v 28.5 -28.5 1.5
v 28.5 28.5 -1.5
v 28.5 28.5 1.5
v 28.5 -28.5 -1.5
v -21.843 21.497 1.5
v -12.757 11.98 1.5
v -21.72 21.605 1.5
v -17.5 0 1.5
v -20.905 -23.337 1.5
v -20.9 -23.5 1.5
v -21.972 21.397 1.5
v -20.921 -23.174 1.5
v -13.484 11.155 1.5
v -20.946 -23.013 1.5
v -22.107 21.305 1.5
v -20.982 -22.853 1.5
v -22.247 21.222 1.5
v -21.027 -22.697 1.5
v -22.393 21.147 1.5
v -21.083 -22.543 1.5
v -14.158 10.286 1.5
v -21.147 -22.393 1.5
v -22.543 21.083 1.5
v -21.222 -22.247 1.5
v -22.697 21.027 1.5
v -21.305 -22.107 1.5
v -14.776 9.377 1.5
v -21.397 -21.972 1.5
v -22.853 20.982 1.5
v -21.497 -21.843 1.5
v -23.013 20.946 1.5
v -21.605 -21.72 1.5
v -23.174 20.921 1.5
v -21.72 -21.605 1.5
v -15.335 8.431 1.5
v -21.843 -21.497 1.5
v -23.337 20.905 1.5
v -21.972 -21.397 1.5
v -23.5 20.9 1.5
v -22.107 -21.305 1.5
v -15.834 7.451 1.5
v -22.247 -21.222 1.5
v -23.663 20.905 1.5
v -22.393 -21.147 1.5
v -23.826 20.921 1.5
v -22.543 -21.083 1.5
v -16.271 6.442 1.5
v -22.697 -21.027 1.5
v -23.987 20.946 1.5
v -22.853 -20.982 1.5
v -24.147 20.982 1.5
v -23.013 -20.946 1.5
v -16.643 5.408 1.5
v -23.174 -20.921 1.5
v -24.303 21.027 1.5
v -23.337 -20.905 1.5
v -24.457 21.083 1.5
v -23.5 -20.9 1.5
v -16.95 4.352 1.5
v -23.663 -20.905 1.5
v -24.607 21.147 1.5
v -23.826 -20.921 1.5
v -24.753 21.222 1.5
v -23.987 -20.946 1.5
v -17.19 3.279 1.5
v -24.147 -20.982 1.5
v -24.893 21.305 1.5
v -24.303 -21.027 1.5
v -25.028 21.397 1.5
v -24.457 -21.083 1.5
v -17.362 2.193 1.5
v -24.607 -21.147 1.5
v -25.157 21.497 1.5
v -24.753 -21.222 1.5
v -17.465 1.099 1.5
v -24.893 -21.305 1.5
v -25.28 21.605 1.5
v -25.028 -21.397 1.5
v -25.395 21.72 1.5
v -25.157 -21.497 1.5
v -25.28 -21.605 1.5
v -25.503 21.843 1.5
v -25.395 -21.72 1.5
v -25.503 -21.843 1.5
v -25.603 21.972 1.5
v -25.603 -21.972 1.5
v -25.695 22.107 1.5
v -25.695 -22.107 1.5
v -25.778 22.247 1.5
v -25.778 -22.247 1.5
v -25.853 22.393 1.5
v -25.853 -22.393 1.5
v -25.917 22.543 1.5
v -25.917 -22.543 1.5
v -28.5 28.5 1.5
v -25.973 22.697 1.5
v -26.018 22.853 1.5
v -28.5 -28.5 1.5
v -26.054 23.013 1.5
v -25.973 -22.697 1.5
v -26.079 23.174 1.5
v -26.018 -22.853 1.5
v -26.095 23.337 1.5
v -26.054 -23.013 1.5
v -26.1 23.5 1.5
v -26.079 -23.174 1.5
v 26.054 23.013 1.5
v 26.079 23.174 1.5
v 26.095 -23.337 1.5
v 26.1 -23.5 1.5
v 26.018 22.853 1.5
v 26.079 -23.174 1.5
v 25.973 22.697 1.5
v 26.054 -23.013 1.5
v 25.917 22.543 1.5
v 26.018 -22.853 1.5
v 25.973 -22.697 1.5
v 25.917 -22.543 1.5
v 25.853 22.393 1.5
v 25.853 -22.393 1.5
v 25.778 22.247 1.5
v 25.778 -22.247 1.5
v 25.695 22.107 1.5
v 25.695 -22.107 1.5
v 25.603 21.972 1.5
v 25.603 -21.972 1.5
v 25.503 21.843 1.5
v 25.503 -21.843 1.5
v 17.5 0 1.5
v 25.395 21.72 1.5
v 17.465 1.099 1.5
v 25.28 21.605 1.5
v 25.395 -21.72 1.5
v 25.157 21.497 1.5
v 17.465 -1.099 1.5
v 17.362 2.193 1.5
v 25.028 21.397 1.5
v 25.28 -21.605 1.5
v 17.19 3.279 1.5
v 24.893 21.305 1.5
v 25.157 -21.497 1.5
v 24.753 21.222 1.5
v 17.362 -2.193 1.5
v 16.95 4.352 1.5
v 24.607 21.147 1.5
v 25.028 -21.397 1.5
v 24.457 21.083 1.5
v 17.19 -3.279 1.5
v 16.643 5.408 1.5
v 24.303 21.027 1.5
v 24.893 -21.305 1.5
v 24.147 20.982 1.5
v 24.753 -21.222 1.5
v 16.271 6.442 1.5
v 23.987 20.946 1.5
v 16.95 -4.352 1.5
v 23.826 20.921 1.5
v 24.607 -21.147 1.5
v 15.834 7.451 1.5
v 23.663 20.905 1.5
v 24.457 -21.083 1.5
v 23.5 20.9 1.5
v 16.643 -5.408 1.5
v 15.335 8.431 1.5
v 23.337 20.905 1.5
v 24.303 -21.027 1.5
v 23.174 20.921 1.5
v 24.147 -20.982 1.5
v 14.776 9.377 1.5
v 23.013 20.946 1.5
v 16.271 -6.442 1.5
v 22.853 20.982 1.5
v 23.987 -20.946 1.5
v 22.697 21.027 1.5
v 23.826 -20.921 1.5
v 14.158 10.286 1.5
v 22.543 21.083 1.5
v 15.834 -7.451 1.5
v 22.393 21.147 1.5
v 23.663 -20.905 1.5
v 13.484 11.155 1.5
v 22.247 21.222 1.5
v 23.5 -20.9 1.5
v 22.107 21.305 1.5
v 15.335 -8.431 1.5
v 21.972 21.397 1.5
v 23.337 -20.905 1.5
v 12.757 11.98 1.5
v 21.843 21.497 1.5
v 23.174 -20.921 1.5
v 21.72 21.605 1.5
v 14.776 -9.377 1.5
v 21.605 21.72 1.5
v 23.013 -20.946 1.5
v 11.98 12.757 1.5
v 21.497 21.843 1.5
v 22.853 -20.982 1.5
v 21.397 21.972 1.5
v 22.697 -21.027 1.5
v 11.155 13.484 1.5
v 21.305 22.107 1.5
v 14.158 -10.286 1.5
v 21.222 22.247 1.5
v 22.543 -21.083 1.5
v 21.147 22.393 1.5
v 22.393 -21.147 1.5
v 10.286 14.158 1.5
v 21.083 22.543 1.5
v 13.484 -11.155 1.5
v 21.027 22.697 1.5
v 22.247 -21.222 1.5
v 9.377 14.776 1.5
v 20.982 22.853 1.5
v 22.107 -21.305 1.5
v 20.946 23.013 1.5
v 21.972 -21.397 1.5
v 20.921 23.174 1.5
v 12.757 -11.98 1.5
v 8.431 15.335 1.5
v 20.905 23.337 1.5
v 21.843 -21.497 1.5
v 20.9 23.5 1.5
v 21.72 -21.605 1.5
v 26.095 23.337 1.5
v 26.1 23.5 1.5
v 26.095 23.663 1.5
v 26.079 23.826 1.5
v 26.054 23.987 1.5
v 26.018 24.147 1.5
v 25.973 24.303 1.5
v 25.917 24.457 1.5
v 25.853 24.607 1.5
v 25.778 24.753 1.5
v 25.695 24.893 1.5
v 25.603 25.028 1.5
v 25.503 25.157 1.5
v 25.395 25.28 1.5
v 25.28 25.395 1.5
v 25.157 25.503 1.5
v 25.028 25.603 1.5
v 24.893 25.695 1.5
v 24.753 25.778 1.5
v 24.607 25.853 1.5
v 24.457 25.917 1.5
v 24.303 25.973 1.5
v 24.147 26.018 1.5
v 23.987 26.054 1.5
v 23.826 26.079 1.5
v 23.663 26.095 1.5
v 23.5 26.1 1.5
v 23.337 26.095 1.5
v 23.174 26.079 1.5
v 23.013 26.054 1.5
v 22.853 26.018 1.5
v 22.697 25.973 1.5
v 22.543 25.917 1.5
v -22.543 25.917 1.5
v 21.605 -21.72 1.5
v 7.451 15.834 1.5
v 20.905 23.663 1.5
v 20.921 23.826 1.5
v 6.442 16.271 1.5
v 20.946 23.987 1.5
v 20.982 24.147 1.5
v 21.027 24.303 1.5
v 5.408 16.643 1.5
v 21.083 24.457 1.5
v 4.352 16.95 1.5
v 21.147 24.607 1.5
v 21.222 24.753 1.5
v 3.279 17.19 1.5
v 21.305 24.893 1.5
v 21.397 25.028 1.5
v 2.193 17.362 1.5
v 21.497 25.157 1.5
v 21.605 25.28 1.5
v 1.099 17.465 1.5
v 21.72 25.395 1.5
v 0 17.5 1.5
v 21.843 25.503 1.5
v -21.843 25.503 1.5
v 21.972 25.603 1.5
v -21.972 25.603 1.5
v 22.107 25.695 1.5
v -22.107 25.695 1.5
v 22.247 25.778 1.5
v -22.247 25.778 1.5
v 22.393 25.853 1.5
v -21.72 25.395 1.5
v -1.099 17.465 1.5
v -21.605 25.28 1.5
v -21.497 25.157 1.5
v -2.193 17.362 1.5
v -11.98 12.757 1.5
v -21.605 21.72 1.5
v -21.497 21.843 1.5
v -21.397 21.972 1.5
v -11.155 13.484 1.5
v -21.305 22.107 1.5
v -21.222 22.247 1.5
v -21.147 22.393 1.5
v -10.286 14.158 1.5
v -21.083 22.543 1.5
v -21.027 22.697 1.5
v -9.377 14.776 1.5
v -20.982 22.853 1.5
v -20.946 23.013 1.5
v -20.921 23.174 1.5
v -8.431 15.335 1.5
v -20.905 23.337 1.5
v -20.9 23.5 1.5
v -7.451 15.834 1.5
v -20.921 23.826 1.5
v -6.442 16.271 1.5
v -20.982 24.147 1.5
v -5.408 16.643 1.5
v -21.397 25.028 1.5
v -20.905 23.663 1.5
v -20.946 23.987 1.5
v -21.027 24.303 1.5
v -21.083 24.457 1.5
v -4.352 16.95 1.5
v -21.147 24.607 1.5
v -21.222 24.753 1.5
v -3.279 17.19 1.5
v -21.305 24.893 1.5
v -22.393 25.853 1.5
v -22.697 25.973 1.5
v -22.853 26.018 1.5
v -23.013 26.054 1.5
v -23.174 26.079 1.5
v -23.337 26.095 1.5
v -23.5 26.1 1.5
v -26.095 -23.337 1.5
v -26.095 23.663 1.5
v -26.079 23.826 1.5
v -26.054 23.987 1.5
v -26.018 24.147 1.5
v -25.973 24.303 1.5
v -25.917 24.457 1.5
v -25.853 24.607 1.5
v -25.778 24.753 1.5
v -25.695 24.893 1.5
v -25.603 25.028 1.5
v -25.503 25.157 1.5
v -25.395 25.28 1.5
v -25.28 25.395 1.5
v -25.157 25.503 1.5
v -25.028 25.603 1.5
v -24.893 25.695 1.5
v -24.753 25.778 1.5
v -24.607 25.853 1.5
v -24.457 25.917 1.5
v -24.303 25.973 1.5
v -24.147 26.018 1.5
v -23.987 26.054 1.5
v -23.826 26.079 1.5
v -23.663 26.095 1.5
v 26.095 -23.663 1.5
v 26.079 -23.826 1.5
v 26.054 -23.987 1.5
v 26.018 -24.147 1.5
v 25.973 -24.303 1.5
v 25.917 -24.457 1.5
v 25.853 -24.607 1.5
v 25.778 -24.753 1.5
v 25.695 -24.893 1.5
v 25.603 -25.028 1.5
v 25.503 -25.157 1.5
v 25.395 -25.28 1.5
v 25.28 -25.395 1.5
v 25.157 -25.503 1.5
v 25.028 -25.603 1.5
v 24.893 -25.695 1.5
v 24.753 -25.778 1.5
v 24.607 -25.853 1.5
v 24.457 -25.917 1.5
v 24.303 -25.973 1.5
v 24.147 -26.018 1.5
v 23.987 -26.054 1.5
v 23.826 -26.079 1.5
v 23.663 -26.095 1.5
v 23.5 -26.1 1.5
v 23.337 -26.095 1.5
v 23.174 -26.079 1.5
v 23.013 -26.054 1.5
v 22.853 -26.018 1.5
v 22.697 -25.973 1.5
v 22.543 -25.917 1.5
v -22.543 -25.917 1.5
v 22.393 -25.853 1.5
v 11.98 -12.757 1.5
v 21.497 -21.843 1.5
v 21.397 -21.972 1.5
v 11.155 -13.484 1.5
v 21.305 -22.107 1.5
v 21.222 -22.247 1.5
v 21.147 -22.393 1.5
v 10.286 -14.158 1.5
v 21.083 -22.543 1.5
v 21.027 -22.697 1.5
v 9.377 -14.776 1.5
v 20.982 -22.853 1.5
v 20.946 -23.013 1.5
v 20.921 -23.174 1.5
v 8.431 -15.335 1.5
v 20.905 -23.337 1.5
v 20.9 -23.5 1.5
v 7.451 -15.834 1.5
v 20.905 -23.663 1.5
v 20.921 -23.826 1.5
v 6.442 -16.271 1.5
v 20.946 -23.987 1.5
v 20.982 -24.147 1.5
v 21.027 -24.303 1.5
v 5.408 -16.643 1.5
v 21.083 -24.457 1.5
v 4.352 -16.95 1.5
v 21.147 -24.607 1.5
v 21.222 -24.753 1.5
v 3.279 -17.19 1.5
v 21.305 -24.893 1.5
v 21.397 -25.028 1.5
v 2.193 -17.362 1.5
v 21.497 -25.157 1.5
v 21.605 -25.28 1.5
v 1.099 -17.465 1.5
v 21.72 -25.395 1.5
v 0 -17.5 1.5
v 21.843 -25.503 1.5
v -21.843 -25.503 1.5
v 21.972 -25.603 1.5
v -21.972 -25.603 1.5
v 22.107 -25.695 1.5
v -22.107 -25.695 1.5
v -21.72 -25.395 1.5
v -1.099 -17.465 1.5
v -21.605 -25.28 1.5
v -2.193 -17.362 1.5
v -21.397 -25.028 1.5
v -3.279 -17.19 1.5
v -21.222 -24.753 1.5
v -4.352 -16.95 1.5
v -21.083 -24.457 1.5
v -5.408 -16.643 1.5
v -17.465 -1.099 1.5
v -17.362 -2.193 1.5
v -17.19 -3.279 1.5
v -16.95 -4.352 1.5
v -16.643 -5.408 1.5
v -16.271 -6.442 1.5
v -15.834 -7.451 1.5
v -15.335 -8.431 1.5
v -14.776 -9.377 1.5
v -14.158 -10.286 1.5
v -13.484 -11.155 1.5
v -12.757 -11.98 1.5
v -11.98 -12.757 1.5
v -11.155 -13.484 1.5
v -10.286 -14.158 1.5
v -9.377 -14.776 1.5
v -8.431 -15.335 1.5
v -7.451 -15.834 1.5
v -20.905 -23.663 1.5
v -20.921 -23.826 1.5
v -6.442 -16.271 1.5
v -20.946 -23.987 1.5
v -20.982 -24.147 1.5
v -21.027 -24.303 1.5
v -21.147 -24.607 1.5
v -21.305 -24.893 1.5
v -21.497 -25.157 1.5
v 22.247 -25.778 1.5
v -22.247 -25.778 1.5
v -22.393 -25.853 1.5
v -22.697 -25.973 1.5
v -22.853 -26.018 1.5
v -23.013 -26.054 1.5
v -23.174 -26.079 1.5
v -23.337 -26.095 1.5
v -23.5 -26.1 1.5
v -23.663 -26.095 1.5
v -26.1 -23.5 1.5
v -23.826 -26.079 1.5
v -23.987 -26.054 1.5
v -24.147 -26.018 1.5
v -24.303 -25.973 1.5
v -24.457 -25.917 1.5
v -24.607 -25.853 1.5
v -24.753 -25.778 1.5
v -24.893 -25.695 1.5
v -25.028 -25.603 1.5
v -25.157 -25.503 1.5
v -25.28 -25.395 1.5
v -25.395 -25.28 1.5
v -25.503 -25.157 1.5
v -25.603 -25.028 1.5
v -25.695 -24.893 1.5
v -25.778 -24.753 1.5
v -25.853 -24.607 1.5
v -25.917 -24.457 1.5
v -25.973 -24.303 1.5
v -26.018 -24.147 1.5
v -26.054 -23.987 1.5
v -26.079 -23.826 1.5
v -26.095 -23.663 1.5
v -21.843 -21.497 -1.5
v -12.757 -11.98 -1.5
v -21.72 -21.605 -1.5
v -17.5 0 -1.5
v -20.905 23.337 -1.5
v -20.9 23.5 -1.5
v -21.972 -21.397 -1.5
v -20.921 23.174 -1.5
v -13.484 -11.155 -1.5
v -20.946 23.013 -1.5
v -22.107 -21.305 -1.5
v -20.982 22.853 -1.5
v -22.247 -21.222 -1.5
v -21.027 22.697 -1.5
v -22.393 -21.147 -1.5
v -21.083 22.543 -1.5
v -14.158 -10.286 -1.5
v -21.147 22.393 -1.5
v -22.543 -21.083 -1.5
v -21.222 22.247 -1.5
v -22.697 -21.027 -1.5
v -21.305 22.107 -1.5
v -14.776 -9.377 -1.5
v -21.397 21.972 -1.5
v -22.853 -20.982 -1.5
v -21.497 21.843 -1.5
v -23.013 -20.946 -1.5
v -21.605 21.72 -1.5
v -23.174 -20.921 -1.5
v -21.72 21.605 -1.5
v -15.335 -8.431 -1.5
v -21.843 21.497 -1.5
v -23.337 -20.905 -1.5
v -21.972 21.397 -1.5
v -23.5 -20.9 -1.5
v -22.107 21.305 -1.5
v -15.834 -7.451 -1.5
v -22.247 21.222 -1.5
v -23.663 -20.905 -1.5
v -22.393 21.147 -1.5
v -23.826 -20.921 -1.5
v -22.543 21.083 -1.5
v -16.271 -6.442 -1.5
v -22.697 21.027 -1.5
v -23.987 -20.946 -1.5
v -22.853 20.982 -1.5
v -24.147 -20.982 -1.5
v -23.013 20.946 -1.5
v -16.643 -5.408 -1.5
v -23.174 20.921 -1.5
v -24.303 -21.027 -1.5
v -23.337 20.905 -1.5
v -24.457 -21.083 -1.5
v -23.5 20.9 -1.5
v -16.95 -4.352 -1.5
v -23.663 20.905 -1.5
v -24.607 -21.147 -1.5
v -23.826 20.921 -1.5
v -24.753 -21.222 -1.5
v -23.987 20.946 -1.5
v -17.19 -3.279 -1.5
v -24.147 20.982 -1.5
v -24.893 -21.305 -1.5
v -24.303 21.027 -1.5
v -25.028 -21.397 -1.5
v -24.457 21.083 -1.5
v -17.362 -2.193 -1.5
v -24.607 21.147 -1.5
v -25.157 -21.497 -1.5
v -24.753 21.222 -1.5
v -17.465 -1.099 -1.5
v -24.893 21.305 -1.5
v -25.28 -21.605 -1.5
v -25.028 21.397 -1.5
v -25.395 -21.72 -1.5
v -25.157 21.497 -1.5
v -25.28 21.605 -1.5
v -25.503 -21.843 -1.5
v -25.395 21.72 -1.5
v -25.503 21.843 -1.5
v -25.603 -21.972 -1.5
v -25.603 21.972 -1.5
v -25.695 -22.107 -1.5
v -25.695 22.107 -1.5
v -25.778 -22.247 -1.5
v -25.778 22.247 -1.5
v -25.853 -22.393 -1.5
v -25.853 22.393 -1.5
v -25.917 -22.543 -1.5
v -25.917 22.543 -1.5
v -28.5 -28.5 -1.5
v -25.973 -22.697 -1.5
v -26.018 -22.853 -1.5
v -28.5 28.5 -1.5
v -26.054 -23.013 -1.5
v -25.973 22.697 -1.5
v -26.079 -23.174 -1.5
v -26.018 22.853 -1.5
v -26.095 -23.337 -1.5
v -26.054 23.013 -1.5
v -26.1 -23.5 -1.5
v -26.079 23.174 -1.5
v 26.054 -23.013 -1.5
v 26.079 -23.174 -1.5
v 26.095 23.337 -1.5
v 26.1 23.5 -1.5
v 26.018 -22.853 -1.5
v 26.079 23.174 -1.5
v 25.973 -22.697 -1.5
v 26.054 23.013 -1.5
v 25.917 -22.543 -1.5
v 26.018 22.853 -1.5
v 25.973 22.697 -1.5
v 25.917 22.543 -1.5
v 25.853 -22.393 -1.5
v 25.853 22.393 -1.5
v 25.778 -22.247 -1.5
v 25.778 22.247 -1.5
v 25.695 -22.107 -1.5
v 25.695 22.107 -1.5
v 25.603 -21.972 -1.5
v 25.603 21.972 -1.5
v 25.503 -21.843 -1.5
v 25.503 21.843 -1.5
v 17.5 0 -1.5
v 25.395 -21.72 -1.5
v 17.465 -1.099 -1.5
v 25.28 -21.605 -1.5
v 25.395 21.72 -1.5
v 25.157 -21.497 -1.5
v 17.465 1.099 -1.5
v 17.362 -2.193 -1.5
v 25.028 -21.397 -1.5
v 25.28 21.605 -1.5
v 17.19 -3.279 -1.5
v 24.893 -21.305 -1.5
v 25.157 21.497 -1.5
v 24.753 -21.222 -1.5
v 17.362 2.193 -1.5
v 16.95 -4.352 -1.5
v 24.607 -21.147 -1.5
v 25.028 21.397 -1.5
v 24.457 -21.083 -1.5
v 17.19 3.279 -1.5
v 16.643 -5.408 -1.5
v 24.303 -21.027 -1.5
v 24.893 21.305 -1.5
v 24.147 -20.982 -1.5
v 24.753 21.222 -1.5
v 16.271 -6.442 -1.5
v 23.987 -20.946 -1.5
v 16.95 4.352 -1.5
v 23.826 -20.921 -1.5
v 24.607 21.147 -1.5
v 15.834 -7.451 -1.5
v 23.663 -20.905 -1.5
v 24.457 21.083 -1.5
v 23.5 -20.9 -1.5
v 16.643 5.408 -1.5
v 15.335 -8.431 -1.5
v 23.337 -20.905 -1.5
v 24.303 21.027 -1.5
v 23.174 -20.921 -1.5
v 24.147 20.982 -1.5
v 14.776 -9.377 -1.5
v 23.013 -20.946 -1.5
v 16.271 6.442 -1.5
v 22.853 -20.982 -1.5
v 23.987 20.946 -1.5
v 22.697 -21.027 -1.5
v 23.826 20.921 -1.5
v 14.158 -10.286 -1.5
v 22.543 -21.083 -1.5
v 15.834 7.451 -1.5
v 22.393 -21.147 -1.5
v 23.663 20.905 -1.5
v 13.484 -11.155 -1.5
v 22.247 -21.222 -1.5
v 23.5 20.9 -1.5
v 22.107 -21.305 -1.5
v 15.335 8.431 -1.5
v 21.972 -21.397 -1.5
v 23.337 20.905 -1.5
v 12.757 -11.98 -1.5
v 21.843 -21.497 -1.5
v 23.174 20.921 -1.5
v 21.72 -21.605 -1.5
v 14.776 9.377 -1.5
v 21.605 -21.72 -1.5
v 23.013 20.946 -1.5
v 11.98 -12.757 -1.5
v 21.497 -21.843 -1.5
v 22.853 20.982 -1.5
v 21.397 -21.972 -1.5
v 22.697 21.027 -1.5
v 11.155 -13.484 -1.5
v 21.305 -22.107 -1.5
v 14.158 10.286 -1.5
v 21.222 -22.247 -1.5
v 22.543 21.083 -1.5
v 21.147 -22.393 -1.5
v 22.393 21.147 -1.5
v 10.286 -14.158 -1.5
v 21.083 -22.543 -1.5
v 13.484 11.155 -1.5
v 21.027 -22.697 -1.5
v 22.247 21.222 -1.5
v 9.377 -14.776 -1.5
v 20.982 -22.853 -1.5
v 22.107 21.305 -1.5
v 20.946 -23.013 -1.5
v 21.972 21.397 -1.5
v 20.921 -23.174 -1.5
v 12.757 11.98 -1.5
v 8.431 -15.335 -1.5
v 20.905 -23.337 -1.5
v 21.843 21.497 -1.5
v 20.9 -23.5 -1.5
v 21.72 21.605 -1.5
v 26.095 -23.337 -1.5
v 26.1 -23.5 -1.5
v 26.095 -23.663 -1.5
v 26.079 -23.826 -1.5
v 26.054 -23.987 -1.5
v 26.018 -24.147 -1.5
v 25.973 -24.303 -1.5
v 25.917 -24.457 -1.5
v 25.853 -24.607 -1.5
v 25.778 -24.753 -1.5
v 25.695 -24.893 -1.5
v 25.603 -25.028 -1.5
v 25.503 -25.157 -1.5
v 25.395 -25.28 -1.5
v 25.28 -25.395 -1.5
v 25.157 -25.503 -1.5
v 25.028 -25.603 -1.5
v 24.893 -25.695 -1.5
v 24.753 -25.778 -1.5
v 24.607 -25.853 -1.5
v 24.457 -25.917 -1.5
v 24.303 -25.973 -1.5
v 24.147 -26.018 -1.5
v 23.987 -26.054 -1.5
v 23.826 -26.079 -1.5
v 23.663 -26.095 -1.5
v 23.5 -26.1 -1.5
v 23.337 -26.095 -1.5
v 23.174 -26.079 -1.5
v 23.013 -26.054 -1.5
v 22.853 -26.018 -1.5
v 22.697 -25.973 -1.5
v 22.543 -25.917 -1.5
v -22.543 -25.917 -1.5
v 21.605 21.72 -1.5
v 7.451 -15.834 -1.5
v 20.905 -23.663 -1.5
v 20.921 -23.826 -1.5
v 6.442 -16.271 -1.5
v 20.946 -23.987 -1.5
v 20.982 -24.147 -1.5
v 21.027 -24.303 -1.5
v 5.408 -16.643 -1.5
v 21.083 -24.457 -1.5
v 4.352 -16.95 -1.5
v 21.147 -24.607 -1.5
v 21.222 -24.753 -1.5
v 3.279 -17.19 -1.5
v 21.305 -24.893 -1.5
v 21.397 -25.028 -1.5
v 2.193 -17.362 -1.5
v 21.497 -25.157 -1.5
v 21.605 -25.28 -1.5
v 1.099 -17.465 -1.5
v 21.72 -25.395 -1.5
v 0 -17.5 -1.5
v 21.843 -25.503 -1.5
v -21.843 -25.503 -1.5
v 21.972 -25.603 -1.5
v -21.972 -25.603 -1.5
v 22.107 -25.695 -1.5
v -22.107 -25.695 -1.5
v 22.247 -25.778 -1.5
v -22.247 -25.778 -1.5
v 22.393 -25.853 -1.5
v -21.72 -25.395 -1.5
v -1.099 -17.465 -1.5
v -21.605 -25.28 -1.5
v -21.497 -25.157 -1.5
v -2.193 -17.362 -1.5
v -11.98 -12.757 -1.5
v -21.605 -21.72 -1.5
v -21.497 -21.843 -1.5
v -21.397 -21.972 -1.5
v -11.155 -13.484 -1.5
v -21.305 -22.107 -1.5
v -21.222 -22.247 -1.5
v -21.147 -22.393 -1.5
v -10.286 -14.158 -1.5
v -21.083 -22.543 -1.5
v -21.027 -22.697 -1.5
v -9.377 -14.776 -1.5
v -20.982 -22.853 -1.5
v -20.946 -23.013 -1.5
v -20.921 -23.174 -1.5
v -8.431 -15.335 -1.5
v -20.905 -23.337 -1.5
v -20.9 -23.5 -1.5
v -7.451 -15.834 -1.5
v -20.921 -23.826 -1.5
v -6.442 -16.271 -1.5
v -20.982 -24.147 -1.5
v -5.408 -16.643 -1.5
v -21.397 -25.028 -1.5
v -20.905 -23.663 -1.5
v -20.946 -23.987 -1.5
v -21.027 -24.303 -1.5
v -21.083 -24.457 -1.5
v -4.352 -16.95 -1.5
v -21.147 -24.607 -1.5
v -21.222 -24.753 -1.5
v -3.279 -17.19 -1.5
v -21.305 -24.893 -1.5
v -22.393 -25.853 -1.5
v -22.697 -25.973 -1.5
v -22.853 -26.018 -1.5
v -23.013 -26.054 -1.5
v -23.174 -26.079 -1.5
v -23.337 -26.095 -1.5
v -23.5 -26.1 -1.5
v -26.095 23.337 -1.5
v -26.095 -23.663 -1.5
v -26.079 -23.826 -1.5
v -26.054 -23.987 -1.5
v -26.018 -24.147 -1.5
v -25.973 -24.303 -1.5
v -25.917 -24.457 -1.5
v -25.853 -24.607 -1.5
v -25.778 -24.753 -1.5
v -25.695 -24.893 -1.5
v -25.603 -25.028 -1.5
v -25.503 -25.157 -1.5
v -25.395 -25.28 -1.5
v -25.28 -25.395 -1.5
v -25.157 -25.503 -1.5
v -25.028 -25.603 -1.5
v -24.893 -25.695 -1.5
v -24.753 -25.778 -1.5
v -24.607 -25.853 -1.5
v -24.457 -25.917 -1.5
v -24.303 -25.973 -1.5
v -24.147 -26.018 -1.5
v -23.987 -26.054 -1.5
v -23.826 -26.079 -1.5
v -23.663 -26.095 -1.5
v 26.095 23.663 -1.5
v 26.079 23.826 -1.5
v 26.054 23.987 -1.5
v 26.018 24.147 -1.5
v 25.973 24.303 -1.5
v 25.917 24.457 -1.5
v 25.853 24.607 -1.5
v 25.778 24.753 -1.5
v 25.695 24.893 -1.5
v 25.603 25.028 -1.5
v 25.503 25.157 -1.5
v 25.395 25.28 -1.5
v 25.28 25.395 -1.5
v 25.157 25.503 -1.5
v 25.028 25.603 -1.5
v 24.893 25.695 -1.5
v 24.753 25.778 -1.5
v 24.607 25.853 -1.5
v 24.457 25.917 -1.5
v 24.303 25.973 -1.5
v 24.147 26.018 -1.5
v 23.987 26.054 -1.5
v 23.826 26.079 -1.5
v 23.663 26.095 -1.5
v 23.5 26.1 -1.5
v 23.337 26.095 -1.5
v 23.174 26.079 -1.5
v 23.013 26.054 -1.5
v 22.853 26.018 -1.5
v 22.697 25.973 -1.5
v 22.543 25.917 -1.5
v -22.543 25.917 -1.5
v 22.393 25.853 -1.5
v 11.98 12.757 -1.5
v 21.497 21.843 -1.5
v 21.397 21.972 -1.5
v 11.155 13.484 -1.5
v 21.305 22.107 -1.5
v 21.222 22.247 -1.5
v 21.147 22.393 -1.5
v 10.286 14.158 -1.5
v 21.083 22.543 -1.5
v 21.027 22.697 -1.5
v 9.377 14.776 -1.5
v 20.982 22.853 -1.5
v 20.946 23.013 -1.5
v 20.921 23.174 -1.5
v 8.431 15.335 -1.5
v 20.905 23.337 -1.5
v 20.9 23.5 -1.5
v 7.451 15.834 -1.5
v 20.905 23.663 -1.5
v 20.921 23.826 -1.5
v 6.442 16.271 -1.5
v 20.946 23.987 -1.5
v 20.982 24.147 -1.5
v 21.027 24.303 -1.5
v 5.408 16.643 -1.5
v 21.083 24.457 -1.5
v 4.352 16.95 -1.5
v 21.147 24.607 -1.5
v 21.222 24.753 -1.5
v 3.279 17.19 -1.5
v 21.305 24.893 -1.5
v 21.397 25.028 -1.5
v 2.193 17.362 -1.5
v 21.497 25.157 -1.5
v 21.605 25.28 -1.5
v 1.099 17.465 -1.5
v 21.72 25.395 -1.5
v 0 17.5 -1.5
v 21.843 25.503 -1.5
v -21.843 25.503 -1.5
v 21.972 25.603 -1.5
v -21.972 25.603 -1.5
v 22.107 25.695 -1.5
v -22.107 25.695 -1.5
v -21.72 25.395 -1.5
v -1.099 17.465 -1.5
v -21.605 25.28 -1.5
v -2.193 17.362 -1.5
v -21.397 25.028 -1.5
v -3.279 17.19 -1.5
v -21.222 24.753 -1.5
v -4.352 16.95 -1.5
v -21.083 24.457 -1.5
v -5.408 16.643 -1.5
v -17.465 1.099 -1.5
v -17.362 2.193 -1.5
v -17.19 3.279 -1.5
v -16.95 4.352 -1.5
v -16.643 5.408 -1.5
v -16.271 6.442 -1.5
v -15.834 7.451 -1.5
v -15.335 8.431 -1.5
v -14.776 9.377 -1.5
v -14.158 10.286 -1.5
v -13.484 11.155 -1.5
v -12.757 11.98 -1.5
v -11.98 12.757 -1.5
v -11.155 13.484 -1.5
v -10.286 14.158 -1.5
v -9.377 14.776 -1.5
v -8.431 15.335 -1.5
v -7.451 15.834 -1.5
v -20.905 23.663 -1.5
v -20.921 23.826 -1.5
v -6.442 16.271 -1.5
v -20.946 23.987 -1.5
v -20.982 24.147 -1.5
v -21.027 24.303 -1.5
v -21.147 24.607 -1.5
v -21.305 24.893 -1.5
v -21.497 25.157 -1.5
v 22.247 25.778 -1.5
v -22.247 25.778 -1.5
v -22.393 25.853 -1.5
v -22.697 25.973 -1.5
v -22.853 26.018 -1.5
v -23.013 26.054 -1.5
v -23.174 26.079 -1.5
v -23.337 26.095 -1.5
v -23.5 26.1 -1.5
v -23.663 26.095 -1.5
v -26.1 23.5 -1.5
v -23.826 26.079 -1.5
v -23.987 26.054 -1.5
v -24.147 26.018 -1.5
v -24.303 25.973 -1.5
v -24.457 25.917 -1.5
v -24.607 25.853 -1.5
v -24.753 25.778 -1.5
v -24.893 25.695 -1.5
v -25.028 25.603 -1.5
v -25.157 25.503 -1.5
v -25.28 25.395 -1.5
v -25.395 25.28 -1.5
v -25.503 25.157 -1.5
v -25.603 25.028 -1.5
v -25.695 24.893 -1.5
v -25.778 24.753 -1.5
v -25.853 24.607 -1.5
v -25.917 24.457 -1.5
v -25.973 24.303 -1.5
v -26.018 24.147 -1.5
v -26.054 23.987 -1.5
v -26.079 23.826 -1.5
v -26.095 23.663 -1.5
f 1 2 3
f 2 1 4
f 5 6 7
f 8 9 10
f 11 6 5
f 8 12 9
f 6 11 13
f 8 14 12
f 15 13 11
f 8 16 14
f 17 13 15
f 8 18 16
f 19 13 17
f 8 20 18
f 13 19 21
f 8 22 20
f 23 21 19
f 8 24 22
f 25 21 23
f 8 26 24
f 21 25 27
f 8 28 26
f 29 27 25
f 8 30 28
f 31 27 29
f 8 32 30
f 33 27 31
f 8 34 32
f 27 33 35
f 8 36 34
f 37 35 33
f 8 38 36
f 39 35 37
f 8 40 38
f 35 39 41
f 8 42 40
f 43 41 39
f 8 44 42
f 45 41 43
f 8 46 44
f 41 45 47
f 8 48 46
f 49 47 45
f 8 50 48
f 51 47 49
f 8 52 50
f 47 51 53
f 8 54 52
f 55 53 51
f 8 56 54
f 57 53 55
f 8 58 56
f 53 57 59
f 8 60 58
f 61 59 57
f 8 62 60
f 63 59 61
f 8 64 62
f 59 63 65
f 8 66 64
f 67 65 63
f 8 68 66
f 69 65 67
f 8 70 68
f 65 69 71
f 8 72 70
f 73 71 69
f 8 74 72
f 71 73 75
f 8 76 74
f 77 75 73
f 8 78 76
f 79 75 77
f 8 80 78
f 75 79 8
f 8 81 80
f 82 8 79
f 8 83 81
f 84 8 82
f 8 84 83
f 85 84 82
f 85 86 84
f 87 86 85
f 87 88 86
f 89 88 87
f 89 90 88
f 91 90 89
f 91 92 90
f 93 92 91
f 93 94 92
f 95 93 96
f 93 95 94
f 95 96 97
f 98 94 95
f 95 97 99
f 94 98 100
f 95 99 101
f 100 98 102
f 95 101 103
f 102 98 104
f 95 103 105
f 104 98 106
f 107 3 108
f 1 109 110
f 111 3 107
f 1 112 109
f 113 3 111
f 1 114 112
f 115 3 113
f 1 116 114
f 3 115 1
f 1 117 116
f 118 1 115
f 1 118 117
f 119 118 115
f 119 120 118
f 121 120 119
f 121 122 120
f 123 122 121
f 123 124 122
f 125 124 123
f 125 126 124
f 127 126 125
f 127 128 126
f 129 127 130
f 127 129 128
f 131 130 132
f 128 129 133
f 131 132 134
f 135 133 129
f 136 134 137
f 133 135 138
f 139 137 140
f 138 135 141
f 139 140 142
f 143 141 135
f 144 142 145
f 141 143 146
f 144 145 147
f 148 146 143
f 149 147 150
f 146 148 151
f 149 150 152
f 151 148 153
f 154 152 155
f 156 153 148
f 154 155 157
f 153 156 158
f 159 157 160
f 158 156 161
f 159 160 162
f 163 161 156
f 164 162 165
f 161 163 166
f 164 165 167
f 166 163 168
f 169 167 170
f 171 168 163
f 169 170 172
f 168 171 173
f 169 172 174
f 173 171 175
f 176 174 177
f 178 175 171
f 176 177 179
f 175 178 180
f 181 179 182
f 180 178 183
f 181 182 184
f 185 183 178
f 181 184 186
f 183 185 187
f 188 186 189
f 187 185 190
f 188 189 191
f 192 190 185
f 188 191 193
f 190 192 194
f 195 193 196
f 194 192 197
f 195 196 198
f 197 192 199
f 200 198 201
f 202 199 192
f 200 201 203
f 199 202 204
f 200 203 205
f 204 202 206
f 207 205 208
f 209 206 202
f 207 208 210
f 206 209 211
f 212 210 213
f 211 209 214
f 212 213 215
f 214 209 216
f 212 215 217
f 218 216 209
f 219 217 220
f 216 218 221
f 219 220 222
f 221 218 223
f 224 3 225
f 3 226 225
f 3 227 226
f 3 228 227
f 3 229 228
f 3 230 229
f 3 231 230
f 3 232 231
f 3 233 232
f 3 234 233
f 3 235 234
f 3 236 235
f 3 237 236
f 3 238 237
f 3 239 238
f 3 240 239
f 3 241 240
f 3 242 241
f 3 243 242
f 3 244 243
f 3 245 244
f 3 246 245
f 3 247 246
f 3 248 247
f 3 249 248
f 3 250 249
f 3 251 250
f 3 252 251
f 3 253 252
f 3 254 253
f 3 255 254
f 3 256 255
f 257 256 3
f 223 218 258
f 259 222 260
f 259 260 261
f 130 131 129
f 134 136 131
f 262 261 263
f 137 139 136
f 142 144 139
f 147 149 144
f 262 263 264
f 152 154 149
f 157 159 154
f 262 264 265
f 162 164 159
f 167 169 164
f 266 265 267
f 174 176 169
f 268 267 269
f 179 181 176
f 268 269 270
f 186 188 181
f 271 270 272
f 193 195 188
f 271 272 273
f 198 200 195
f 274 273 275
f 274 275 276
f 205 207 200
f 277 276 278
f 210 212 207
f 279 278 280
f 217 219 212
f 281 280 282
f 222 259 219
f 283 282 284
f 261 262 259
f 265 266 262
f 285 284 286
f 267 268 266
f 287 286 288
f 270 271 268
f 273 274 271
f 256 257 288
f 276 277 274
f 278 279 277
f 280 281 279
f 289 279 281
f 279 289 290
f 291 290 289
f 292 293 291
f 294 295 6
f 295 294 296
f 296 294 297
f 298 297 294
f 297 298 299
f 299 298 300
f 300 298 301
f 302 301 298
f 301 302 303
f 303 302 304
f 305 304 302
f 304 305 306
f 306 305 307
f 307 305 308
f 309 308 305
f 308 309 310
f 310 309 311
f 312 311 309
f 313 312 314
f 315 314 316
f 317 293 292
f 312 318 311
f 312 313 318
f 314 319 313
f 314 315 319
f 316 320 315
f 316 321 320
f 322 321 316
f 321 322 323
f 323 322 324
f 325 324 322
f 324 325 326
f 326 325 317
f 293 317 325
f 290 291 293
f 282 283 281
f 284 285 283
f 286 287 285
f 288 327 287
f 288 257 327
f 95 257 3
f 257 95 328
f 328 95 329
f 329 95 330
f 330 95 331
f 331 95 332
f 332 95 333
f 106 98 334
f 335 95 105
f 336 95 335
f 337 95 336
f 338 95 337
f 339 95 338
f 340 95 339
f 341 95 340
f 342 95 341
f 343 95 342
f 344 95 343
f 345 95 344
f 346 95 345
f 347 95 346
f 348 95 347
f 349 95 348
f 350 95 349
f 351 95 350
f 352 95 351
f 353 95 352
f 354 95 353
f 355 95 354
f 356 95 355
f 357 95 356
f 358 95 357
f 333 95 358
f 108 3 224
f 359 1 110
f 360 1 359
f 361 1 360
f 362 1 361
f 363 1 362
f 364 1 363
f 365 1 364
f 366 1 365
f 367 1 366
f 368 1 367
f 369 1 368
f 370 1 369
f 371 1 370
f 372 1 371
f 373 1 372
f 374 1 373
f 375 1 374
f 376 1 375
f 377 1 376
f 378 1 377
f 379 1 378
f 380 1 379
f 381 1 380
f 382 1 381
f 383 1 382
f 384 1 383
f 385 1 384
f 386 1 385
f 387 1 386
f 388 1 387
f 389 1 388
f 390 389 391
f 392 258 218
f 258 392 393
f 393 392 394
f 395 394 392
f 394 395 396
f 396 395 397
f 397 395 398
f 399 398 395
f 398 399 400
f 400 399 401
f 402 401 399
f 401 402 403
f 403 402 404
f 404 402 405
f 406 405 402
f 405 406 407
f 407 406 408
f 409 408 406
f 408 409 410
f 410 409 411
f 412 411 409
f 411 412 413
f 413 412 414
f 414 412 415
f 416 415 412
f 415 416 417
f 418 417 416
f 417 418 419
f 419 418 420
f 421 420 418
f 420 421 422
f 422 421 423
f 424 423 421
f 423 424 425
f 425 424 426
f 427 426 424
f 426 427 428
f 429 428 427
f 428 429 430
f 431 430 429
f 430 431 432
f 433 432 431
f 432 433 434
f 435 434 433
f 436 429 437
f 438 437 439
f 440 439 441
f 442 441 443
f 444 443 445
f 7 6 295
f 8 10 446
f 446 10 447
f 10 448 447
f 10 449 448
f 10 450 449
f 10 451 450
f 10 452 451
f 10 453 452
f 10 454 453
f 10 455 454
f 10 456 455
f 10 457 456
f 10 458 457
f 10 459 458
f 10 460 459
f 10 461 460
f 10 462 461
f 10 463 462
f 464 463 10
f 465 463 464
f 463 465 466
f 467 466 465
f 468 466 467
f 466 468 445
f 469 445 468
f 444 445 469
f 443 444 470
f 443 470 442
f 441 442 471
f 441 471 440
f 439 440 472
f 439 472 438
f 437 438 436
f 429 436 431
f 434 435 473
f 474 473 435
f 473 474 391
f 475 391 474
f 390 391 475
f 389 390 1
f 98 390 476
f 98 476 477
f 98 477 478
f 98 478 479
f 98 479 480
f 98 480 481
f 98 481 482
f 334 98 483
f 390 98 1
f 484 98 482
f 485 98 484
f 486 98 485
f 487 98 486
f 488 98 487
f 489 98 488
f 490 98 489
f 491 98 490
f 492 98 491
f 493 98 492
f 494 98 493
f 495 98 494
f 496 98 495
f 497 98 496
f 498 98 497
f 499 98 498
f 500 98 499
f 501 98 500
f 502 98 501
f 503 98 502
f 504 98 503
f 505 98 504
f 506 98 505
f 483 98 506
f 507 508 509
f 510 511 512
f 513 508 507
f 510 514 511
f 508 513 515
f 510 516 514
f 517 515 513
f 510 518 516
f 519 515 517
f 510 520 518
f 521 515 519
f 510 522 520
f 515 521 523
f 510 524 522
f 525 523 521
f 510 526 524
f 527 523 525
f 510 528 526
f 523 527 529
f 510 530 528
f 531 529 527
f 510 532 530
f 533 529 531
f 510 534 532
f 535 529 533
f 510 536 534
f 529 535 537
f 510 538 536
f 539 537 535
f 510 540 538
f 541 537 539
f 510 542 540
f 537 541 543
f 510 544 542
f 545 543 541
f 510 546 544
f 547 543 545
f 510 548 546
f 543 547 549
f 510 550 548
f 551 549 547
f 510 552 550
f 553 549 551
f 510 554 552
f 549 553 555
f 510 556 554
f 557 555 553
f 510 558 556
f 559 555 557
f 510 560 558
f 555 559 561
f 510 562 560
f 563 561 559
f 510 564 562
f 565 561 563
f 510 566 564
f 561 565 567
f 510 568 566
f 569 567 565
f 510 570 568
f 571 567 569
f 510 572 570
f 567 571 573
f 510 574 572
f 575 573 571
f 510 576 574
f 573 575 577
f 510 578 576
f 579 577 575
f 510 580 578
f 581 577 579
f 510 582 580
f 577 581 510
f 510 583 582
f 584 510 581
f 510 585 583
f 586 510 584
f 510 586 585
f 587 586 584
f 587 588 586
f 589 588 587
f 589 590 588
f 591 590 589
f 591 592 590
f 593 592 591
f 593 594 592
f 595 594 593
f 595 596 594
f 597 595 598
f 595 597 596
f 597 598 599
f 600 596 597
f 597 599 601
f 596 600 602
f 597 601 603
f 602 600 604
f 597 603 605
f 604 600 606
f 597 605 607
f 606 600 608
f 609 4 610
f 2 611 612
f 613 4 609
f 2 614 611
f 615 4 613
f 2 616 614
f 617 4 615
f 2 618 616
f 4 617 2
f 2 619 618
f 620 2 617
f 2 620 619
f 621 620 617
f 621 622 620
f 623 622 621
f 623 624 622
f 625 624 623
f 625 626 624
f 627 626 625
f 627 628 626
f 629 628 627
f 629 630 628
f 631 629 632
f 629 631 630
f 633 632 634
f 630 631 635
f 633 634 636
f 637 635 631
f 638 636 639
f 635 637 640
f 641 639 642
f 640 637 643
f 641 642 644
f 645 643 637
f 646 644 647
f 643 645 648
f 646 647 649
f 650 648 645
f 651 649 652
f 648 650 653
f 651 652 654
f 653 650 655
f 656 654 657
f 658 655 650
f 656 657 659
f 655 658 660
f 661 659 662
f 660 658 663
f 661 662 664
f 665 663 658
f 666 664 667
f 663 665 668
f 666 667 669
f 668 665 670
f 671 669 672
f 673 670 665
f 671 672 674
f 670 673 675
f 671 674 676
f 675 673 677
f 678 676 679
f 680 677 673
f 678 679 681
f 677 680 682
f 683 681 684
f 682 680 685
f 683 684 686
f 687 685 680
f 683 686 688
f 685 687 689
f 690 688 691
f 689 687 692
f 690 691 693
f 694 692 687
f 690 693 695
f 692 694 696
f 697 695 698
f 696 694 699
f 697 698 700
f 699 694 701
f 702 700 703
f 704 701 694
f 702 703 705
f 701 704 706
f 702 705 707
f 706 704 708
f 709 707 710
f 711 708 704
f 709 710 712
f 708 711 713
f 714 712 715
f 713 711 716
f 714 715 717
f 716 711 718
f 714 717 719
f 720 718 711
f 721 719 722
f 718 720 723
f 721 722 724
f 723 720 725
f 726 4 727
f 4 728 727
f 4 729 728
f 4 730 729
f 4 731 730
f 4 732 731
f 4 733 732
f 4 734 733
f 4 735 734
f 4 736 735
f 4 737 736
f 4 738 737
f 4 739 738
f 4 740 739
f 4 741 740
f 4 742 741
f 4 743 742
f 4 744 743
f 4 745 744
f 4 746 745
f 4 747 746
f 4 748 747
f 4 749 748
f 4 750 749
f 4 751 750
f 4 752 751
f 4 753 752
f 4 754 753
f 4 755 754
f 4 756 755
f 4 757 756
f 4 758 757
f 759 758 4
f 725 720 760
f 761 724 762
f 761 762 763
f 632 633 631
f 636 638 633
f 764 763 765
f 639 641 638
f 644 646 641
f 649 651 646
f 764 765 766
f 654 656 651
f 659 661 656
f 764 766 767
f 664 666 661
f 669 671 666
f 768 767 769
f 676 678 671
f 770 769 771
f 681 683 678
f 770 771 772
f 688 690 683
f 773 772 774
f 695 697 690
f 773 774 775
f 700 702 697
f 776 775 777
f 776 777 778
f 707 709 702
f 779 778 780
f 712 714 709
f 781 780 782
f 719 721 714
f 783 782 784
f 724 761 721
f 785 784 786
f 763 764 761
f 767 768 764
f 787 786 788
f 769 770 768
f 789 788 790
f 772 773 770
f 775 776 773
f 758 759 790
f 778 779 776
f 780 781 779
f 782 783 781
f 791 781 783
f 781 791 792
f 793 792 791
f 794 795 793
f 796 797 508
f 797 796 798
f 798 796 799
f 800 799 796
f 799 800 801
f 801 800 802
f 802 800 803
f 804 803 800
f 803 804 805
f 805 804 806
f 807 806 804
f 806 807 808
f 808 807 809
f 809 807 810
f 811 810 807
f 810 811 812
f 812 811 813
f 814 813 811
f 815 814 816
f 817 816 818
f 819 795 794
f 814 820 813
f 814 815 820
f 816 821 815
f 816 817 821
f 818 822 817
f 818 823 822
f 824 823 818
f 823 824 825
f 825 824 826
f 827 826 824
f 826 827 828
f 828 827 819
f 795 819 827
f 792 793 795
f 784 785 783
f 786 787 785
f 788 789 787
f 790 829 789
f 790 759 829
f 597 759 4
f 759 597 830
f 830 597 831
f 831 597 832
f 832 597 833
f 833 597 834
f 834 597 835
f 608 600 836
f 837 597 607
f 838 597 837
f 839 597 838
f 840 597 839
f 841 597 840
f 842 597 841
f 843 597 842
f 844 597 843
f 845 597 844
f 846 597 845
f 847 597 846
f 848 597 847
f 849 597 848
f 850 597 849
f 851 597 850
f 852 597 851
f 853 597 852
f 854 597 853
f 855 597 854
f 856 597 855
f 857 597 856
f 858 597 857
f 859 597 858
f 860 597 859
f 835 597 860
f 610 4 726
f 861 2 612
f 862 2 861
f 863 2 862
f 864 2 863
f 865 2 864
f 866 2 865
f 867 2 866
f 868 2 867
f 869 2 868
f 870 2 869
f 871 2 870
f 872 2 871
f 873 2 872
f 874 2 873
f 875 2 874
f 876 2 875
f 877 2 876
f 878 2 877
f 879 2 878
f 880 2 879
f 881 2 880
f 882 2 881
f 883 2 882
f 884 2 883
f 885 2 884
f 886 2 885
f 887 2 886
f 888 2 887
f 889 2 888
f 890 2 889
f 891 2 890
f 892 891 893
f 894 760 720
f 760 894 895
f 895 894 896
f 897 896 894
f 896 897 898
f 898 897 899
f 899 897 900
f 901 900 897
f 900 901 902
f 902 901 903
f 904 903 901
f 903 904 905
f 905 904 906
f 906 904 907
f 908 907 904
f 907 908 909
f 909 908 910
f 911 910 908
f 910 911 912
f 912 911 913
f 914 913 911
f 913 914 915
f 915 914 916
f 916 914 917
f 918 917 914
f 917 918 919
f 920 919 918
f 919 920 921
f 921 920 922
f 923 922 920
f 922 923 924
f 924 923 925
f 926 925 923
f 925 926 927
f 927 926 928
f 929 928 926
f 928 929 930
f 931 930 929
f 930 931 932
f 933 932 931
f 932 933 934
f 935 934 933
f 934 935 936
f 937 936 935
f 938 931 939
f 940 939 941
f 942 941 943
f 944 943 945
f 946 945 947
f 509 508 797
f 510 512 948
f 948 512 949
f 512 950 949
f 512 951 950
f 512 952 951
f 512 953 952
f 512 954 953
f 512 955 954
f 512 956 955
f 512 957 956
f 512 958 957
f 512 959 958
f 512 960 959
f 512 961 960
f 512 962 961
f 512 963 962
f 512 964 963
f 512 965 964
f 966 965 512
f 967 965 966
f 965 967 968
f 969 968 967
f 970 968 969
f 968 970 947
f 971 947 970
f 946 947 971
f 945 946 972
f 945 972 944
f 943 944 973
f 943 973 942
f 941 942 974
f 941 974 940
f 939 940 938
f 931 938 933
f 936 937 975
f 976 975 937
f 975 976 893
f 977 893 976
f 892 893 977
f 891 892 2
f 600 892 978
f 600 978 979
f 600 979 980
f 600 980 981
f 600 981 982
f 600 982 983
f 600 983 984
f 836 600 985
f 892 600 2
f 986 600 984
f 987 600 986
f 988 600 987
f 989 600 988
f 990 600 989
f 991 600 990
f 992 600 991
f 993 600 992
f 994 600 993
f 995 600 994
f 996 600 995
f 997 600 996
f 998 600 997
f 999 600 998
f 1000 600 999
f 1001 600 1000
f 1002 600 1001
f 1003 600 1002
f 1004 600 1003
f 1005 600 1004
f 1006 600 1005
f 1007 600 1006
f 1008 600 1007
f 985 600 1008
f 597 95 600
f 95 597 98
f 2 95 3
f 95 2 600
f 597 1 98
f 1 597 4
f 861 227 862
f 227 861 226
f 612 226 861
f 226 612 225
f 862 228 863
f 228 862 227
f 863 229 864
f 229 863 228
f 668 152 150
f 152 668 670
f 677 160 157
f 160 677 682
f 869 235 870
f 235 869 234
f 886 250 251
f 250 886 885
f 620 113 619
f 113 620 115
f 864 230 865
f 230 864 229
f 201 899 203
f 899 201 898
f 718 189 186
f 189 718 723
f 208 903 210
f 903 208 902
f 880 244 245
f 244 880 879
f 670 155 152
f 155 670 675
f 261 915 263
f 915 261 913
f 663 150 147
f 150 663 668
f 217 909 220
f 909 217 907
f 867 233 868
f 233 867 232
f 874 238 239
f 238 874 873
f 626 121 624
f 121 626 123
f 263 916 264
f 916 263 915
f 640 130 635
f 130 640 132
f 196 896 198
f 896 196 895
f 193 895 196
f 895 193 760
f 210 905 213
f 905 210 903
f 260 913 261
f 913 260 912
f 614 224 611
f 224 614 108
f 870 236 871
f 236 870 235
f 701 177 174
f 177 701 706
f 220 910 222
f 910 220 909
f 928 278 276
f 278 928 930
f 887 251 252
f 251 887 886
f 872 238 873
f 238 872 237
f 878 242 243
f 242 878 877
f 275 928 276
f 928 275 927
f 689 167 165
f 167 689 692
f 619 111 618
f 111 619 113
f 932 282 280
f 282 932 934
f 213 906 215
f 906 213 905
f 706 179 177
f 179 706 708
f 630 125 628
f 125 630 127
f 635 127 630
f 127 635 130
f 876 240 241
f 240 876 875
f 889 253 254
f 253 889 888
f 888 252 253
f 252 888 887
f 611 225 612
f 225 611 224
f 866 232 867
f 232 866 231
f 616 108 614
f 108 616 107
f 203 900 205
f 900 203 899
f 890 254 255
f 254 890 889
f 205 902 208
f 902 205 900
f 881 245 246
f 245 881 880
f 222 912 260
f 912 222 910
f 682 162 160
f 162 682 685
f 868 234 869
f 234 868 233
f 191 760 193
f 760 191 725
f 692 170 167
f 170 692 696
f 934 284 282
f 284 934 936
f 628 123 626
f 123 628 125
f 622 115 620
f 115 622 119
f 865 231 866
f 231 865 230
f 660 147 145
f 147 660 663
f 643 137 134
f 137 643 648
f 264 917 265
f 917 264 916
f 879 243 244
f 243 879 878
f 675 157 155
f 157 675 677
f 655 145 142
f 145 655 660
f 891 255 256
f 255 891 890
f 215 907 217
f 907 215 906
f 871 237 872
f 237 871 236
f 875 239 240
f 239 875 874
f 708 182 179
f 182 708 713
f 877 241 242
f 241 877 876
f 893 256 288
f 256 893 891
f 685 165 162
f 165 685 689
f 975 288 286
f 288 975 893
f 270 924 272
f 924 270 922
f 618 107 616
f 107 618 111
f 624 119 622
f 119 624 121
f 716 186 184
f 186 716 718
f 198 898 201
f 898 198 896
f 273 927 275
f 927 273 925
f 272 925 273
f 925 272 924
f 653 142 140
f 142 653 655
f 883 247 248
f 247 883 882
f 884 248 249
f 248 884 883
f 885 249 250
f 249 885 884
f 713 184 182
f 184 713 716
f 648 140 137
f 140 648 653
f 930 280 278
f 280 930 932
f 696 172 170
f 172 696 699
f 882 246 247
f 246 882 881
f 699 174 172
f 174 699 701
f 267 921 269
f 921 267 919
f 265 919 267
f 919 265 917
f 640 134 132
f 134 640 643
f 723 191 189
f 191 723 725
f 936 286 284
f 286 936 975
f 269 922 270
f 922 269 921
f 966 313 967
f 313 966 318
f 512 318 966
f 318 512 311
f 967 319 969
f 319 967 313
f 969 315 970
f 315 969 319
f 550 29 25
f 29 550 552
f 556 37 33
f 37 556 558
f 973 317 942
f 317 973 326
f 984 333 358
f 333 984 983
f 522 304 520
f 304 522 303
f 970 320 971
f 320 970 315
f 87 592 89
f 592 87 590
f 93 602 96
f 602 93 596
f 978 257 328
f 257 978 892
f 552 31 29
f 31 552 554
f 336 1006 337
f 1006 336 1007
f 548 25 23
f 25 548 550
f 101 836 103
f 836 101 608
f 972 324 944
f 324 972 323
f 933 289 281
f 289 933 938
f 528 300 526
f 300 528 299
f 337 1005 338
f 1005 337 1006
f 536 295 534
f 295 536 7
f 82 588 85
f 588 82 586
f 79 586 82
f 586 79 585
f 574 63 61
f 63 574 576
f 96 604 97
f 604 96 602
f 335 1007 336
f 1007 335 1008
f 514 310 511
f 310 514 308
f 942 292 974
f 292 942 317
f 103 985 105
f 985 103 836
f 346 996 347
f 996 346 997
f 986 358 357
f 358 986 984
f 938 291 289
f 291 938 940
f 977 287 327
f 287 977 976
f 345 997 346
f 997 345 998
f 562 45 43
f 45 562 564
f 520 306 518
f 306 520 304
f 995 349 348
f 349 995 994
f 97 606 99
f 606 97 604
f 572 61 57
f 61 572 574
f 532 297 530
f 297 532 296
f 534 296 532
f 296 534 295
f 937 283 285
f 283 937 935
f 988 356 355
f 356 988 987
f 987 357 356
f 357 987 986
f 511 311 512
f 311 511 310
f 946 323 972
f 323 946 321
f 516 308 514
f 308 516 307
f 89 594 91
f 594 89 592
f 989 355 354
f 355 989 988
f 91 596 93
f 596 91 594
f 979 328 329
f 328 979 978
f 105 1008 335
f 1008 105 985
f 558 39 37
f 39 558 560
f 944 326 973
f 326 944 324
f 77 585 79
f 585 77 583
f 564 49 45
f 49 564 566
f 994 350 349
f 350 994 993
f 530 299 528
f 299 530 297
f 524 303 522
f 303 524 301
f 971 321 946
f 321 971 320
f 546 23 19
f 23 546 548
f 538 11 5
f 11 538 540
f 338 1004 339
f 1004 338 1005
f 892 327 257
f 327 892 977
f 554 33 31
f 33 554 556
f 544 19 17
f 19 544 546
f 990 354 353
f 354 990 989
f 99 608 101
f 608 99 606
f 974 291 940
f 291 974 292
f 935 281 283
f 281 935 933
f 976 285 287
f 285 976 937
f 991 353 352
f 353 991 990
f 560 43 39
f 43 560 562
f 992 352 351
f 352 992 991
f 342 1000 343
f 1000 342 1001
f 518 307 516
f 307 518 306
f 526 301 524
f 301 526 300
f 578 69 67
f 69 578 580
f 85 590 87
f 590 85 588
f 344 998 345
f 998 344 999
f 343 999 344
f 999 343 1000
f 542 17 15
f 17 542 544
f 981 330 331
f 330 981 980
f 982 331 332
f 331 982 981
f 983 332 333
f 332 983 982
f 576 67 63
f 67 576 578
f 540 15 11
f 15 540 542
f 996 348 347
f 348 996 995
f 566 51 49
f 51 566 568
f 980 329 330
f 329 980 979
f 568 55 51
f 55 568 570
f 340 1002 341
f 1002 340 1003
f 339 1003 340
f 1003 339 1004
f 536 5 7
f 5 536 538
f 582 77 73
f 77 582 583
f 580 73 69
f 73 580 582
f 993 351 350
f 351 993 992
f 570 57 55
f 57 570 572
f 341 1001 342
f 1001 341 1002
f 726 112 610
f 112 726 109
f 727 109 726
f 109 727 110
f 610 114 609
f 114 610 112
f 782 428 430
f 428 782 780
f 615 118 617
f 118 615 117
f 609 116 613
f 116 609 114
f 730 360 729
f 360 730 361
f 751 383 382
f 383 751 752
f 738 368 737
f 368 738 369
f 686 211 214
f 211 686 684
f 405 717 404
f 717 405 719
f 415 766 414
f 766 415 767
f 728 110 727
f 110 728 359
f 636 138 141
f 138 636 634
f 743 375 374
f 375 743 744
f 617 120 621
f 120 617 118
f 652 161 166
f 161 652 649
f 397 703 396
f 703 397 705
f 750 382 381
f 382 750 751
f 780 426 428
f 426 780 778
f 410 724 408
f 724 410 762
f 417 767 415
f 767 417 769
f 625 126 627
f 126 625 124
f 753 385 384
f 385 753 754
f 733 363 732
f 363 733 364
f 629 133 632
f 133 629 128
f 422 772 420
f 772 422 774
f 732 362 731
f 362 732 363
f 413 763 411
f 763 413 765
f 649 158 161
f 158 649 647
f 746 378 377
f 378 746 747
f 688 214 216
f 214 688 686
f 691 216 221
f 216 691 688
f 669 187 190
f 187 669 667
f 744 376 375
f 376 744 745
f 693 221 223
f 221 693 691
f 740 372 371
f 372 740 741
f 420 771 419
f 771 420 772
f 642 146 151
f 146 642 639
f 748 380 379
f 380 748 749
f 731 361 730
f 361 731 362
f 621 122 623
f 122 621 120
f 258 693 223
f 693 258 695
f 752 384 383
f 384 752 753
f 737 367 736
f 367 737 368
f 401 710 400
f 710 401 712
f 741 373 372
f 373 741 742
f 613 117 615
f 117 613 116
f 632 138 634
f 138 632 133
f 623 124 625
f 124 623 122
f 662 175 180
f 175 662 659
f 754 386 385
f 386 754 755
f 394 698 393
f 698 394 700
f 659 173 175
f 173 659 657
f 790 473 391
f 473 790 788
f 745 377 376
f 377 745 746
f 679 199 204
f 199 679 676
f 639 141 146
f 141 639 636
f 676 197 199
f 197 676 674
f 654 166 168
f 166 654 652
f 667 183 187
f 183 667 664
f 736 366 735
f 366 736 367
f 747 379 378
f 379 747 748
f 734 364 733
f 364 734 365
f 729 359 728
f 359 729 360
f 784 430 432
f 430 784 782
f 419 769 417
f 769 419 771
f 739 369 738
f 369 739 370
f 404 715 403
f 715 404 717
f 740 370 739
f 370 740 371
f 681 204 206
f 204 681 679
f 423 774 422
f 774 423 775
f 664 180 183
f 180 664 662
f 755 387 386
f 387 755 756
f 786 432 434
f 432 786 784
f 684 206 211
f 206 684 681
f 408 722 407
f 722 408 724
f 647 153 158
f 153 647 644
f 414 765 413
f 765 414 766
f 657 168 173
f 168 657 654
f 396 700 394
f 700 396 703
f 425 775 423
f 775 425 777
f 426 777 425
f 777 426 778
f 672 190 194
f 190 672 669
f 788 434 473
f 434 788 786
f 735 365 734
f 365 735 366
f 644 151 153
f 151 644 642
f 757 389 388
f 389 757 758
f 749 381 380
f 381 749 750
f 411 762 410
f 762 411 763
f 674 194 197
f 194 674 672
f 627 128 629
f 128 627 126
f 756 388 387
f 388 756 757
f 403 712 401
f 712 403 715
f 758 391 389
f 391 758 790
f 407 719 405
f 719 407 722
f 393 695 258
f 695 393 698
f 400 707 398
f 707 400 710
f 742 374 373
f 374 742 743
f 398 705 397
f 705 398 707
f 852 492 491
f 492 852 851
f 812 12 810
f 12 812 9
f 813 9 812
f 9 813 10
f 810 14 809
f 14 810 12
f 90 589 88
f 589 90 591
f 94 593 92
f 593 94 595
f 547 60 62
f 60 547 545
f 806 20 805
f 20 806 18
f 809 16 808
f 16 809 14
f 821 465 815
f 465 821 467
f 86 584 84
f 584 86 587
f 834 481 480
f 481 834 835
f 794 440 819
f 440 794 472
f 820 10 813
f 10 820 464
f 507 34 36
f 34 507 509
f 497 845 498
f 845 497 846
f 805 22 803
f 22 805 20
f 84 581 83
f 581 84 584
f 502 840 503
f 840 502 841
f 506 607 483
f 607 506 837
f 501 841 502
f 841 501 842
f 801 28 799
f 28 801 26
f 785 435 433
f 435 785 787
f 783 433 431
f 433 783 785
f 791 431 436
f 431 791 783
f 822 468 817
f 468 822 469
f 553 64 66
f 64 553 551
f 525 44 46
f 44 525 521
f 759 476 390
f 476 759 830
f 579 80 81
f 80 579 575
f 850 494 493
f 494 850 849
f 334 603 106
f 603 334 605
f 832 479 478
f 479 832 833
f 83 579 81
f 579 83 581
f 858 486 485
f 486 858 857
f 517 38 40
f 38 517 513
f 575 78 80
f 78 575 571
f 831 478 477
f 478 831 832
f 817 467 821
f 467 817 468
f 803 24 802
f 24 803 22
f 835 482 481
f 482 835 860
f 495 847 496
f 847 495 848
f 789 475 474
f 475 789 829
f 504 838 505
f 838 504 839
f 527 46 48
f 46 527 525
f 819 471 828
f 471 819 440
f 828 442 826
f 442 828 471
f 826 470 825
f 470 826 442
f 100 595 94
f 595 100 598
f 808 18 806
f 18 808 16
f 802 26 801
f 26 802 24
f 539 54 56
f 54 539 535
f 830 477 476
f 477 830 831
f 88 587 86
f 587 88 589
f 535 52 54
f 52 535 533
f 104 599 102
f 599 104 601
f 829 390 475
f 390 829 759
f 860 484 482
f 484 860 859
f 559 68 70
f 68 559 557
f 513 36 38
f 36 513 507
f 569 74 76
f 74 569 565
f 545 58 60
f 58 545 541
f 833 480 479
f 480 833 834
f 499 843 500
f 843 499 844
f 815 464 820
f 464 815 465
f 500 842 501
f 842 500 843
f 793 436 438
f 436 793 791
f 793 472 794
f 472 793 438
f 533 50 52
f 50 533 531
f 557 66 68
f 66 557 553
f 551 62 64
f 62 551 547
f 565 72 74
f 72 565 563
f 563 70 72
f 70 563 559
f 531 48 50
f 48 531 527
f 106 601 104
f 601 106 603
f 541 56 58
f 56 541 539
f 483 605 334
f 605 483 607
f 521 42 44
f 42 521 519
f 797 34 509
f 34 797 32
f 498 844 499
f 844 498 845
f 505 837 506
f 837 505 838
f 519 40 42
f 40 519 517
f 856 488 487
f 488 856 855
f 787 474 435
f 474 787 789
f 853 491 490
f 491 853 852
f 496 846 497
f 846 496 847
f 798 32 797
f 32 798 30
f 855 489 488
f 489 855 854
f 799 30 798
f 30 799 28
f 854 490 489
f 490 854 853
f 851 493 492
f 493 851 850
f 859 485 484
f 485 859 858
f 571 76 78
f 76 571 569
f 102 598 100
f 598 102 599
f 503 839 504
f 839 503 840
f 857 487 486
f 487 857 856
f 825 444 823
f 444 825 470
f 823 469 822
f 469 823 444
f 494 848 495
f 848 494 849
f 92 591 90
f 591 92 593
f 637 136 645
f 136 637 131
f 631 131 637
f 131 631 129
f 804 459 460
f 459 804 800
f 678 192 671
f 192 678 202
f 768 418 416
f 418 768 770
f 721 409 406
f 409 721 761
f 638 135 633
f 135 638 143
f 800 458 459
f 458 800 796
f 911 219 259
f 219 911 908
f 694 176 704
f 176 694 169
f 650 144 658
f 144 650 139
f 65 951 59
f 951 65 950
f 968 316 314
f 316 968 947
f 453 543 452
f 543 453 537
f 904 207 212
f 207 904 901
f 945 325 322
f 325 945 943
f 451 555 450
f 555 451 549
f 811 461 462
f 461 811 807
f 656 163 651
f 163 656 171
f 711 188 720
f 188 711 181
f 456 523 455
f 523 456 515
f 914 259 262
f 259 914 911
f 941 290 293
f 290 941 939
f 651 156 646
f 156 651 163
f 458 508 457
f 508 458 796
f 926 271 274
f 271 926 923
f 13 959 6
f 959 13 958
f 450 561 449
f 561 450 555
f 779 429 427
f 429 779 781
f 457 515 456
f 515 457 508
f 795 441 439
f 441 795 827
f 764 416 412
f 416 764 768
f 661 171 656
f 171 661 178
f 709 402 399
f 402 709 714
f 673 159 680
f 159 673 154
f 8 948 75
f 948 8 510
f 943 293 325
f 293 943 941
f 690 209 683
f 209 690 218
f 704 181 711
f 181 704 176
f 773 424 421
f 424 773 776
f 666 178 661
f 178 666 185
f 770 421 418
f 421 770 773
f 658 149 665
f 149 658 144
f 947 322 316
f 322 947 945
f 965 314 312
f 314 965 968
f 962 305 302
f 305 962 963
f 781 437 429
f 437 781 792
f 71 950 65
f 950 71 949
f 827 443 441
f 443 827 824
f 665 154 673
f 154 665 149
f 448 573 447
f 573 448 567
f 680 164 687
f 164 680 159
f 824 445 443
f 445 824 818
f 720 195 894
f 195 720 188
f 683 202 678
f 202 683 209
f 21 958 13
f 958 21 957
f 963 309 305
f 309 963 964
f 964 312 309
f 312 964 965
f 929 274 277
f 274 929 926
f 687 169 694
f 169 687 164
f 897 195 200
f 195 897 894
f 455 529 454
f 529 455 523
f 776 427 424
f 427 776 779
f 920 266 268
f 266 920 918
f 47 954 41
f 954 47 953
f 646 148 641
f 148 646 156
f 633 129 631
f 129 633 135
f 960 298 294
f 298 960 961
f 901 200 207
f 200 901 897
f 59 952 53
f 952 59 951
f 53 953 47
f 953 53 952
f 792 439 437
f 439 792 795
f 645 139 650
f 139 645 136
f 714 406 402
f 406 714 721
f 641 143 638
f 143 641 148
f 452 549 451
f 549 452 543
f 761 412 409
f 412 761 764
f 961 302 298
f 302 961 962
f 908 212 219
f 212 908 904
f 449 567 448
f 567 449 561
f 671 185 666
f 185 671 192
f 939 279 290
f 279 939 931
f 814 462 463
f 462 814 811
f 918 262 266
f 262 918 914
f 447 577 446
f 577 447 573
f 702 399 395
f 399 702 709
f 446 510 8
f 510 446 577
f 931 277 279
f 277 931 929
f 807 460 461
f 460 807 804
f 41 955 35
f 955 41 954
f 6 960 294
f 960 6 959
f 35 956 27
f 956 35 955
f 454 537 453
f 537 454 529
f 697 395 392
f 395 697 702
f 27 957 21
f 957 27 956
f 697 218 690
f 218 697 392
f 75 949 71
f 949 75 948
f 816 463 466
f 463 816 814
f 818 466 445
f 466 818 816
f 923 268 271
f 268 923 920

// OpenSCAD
$fn=100;
n_w=57;
bh=47/2;
br=2.6;

module nema_23(){
    difference(){
        
    cube([n_w,n_w,3],center=true);
    translate([bh,bh,-25])
    cylinder(100,br,br);
        translate([-bh,bh,-25])
    cylinder(100,br,br);
        translate([bh,-bh,-25])
    cylinder(100,br,br);
        translate([-bh,-bh,-25])
    cylinder(100,br,br);
        translate([0,0,-25])
        cylinder(100,35/2,35/2);
        
        
    }
}
nema_23();
